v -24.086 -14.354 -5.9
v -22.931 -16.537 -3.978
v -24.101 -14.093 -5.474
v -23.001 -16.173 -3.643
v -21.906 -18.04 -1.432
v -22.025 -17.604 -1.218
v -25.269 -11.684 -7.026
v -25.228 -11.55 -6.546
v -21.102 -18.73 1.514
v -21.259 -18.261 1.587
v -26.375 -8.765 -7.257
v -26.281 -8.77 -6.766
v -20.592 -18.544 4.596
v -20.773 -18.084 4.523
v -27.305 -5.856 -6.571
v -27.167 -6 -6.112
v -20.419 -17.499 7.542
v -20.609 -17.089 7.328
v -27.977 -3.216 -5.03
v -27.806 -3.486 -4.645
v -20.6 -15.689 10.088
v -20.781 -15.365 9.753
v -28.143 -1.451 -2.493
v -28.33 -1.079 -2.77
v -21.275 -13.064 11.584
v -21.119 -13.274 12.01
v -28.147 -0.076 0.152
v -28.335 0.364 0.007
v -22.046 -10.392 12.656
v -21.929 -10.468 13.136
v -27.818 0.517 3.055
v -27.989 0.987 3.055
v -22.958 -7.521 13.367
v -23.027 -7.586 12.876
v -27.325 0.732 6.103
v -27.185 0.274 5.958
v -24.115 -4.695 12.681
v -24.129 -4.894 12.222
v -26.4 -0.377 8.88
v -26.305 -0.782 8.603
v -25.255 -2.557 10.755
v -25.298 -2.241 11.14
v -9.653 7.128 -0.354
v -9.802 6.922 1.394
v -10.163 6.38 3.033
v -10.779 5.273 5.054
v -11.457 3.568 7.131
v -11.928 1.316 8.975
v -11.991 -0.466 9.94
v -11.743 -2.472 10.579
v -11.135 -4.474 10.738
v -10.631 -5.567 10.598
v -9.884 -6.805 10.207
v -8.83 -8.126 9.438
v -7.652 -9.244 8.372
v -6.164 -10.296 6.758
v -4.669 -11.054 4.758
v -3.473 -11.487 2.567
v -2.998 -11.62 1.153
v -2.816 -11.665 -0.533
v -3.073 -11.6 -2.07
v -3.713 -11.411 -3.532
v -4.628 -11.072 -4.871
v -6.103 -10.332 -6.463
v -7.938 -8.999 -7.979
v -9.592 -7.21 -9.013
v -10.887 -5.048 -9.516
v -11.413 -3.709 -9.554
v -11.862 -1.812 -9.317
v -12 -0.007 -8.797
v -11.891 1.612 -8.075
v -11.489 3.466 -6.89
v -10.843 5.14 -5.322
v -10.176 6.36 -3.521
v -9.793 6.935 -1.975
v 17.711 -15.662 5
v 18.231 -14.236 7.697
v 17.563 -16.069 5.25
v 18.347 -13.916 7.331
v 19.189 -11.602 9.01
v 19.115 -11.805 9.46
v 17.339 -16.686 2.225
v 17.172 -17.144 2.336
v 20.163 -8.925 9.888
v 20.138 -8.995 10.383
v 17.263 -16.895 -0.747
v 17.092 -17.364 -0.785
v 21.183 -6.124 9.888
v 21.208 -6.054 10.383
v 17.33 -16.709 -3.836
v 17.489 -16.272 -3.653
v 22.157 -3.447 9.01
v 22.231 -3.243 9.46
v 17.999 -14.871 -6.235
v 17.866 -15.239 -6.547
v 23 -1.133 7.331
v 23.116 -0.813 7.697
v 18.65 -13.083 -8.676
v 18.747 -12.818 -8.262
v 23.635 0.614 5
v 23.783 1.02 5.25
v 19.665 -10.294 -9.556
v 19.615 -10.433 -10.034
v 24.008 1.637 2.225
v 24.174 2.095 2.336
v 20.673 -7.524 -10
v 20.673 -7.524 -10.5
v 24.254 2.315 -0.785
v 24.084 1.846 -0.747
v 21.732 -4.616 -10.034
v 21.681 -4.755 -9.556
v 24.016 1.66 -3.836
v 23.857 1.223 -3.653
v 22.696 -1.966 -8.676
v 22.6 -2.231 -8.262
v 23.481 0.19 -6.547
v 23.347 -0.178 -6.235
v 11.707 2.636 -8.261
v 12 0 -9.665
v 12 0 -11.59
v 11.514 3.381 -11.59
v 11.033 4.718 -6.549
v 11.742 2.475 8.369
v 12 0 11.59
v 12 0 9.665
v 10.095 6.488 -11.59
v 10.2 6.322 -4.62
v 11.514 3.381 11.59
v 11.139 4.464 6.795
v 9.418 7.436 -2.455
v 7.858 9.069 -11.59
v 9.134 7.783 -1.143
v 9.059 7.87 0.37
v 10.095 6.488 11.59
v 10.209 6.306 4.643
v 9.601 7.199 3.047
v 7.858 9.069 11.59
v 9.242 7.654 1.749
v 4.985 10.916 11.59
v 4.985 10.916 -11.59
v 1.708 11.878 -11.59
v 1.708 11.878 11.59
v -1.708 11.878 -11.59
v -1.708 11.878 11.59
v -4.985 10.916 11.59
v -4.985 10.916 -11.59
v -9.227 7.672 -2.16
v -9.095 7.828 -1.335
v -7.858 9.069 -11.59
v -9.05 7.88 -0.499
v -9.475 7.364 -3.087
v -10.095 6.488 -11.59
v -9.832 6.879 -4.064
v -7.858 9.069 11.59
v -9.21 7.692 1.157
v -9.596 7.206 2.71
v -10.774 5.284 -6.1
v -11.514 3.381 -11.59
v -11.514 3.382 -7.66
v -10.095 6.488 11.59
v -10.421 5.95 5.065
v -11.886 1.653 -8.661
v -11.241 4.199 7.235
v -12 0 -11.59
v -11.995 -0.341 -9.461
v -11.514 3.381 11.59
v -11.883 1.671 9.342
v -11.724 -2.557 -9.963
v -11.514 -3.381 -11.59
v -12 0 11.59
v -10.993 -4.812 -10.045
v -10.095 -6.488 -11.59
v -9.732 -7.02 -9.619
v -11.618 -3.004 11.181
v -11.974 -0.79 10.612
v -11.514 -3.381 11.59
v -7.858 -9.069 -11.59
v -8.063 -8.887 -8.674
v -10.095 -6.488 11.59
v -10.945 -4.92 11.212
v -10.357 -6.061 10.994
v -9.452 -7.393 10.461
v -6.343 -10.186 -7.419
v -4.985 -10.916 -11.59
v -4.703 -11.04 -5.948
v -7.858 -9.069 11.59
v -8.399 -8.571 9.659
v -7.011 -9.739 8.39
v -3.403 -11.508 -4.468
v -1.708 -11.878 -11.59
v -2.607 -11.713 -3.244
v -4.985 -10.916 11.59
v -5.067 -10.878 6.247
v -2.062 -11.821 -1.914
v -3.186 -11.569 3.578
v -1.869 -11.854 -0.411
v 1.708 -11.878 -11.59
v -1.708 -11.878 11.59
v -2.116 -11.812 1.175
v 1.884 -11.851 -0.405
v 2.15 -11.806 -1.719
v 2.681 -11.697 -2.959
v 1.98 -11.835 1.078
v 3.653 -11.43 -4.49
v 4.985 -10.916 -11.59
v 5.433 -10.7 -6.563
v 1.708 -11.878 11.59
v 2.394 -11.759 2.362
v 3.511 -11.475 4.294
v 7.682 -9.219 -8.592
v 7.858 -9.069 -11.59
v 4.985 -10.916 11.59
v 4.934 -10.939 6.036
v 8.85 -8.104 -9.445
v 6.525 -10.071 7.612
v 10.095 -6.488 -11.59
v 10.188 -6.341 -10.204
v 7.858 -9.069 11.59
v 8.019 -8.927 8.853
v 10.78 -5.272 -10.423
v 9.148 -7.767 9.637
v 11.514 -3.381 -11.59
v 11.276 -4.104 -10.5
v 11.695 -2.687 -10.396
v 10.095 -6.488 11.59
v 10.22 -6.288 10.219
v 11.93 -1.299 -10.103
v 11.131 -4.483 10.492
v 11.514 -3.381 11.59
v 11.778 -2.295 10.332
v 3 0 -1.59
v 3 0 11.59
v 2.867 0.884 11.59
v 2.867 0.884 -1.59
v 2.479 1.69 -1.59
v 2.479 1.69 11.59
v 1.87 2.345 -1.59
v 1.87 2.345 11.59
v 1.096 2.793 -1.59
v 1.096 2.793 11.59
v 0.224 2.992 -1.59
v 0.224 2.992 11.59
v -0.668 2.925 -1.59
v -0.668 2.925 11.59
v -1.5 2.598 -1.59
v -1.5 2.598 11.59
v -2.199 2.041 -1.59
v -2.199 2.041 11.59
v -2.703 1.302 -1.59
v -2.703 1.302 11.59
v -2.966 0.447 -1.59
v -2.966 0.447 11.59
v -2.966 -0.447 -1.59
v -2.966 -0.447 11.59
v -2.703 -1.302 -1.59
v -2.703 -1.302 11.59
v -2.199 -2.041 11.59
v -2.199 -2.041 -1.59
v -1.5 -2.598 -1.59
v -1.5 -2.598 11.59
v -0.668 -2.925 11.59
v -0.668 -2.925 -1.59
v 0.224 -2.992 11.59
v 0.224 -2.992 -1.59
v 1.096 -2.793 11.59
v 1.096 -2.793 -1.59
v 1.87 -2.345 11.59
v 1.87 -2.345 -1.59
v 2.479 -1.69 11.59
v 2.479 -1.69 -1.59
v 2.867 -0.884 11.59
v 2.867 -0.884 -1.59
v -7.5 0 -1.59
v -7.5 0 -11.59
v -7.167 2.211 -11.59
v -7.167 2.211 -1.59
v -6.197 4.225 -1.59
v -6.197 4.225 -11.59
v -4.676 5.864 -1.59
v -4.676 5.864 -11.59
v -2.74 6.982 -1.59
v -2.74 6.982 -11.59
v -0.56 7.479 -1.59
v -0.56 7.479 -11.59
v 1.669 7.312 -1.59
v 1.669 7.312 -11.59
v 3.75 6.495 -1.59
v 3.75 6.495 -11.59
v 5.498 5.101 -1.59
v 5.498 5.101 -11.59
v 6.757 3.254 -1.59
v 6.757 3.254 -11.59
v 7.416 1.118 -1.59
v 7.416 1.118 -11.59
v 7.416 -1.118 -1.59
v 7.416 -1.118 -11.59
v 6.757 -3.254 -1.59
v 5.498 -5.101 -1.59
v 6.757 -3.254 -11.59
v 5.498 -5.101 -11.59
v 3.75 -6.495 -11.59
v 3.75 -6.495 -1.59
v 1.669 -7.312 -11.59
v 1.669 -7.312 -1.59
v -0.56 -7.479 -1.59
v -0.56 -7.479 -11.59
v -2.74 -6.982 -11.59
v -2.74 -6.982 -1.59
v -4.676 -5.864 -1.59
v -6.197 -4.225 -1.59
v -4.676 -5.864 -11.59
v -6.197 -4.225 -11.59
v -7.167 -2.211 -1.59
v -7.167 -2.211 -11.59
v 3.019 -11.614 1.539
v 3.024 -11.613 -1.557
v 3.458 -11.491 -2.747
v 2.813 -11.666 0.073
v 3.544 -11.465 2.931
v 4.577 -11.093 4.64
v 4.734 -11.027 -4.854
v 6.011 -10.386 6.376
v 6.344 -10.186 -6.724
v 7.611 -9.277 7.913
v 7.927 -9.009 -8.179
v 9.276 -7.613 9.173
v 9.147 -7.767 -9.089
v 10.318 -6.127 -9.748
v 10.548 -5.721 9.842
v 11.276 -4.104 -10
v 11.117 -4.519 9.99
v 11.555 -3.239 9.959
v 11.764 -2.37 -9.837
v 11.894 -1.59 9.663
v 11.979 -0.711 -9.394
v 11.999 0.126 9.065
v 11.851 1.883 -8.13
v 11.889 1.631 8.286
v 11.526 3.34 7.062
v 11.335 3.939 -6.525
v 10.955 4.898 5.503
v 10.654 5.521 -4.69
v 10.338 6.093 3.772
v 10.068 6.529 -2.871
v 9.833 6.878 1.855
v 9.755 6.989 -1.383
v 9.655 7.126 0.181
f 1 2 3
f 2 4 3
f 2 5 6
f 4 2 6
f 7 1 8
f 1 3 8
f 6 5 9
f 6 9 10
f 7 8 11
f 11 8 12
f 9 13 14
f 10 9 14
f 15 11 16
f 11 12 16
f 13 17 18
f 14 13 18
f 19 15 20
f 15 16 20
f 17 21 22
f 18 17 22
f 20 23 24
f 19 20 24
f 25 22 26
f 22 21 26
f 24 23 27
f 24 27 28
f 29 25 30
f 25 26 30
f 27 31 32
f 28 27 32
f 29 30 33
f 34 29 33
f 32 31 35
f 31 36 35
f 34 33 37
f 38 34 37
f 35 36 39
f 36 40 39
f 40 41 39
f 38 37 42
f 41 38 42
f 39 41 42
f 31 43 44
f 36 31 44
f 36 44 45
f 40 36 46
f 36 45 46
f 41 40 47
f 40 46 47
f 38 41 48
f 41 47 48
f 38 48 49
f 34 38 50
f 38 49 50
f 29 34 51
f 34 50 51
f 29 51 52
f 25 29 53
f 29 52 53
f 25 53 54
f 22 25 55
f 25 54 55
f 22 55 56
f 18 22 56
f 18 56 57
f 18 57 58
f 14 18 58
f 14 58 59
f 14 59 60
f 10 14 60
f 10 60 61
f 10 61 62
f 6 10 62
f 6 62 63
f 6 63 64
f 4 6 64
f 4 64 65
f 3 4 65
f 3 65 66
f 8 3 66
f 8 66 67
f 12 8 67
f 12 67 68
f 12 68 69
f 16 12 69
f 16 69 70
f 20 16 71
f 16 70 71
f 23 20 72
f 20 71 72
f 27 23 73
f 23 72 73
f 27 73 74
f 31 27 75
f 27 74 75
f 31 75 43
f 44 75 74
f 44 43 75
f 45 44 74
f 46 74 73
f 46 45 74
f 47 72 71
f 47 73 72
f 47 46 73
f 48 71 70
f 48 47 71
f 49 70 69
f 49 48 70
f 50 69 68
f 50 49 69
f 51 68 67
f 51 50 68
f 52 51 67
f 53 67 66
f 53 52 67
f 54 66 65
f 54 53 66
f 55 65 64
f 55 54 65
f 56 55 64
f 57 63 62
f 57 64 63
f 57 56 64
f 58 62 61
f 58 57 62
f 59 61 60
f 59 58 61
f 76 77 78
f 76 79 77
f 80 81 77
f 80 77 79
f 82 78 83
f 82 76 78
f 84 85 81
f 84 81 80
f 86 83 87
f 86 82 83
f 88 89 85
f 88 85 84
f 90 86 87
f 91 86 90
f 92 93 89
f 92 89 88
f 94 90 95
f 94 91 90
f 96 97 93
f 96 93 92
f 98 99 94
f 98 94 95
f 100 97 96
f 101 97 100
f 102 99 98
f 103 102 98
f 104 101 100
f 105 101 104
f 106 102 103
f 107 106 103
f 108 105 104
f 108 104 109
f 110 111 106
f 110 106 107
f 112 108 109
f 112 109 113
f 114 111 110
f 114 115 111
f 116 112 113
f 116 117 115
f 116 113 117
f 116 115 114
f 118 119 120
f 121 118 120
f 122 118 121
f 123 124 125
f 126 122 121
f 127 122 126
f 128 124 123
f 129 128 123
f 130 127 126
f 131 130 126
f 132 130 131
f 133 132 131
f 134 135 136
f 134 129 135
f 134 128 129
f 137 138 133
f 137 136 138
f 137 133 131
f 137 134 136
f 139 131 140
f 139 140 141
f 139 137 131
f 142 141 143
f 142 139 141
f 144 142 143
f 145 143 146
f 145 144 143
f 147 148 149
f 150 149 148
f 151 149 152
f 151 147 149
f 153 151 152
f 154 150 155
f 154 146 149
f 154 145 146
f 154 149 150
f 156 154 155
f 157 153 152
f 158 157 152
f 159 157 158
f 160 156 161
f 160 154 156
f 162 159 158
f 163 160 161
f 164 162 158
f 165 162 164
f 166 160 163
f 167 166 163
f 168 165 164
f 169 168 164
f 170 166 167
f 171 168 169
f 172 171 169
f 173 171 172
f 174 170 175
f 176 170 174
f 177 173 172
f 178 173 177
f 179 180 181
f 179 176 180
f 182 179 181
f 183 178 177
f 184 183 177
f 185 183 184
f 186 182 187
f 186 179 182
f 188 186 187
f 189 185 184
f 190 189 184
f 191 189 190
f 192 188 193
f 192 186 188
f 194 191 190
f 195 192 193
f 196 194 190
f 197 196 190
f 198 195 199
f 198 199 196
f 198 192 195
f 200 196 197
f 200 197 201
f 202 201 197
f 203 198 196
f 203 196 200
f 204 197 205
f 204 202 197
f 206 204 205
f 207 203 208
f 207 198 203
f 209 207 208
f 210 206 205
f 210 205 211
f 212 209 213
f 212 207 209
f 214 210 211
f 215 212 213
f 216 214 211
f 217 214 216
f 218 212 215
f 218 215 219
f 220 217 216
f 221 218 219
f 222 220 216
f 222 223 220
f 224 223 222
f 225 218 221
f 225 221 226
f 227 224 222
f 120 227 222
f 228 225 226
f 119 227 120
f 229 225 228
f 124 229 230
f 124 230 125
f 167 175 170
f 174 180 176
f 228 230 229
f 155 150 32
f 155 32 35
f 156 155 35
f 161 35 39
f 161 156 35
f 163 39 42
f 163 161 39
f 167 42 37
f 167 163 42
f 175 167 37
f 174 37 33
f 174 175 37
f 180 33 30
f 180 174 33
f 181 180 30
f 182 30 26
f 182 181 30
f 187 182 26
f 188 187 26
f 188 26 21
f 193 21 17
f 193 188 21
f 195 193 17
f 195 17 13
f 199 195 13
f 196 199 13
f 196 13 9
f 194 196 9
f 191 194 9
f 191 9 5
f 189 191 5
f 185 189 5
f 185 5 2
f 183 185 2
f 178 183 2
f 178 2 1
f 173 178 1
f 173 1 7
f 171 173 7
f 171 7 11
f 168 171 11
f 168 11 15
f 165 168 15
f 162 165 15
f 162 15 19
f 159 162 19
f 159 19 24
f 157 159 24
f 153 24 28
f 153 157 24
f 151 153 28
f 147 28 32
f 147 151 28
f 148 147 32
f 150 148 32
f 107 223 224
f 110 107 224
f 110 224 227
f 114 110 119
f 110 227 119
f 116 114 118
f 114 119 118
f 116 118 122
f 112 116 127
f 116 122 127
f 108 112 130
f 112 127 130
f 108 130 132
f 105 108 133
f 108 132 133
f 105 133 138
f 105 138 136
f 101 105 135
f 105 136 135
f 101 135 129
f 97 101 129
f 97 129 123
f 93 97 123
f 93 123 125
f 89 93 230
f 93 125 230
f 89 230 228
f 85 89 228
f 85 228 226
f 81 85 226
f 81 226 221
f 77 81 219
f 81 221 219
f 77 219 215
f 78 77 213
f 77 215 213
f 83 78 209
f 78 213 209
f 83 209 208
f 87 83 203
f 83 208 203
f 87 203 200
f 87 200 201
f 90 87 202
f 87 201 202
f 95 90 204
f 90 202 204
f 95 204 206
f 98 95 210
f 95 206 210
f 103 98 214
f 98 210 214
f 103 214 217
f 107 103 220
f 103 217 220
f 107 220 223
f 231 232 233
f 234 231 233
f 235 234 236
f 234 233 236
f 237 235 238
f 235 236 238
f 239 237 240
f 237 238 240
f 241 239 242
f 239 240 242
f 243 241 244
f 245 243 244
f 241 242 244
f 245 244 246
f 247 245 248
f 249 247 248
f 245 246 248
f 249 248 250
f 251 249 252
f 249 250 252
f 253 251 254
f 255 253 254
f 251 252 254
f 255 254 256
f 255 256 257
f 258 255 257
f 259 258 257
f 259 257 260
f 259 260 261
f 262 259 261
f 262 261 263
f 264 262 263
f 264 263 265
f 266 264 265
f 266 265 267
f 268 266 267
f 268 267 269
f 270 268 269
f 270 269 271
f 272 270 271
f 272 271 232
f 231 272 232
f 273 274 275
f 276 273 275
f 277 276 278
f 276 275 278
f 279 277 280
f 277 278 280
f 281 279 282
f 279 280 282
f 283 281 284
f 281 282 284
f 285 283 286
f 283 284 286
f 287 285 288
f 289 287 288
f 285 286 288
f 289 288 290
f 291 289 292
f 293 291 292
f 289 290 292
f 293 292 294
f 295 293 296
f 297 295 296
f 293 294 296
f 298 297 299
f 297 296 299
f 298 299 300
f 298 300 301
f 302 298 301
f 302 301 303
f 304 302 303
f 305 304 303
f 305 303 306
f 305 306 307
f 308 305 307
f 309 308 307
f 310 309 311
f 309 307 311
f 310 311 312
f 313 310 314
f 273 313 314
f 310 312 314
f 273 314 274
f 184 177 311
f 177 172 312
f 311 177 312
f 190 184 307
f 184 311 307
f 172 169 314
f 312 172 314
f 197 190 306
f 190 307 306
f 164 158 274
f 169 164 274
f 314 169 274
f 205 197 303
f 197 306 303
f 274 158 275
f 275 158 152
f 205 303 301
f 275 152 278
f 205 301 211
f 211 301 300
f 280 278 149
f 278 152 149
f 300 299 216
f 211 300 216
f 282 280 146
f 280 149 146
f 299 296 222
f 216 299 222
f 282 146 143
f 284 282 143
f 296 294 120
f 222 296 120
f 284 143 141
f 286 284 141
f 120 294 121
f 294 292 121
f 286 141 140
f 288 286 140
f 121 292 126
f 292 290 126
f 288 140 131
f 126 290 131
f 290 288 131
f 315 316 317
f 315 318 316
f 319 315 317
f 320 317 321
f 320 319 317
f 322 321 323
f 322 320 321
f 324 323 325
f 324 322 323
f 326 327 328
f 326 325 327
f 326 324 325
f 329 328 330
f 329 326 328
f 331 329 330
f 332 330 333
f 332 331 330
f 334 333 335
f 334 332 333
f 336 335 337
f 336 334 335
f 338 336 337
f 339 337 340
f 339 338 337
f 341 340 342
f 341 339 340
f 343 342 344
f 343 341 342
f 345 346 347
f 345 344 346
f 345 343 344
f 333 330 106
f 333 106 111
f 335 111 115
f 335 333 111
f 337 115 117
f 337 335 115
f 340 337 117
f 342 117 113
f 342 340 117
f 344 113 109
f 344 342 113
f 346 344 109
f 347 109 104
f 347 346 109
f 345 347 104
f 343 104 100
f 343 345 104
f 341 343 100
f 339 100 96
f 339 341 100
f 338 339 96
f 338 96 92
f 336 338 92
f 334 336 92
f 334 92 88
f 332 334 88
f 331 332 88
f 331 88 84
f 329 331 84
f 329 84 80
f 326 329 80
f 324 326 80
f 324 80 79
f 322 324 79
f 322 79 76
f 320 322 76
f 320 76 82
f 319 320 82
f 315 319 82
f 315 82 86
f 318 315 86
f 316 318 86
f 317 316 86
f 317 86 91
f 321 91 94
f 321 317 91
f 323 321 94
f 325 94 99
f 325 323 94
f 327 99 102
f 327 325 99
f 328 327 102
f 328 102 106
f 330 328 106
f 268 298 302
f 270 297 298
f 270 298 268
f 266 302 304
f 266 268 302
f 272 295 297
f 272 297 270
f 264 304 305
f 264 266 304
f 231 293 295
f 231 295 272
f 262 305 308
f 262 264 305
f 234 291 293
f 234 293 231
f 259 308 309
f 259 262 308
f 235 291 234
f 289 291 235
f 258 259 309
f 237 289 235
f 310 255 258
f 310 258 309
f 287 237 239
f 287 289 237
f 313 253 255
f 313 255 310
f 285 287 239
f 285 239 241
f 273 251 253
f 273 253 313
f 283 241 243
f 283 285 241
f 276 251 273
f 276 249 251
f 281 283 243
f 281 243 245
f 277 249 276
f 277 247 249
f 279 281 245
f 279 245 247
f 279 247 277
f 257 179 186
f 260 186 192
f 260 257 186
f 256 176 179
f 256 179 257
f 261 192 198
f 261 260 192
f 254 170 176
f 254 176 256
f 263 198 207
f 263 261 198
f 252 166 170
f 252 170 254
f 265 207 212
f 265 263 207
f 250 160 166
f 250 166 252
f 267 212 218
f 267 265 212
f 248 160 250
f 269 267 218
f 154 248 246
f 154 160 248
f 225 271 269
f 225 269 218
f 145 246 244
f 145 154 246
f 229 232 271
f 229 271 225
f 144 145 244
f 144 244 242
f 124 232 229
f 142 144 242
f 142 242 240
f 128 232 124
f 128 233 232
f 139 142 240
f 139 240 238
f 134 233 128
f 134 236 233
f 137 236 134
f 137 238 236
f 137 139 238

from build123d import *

# Parameters (mm, degrees)
SKETCH1_R           = 12
BOSS_EXTRUDE1_DEPTH = 11.59
EXTRUDE_THIN2_START = -4.1
SKETCH8_R           = 10.5
SKETCH8_R_2         = 10
EXTRUDE_THIN2_DEPTH = 22
SKETCH3_R           = 10.5
SKETCH3_R_2         = 10
EXTRUDE_THIN1_DEPTH = 22
SKETCH4_R           = 7.5
CUT_EXTRUDE1_DEPTH  = 10
SKETCH5_R           = 3
CUT_EXTRUDE2_DEPTH  = 24.1800001


with BuildPart() as part:
    # Sketch1 → Boss-Extrude1 (new body, symmetric)
    with BuildSketch(Plane.XY):
        Circle(SKETCH1_R)
    extrude(amount=BOSS_EXTRUDE1_DEPTH, both=True)

    # Sketch8 → Extrude-Thin2 (add)
    with BuildSketch(Plane(origin=(0, 0, 0), x_dir=(-0.342020143, 0.939692621, 0), z_dir=(0.925416578, 0.336824089, -0.173648178)).offset(EXTRUDE_THIN2_START)):
        with Locations((0, -1.5)):
            Circle(SKETCH8_R)
        with Locations((0, -1.5)):
            Circle(SKETCH8_R_2, mode=Mode.SUBTRACT)
    extrude(amount=-EXTRUDE_THIN2_DEPTH)

    # Sketch3 → Extrude-Thin1 (add)
    with BuildSketch(Plane(origin=(0, 0, 0), x_dir=(0, 0, -1), z_dir=(0.939692621, -0.342020143, 0))):
        Circle(SKETCH3_R)
        Circle(SKETCH3_R_2, mode=Mode.SUBTRACT)
    extrude(amount=EXTRUDE_THIN1_DEPTH)

    # Sketch4 → Cut-Extrude1 (cut)
    with BuildSketch(Plane(origin=(0, 0, -11.59), x_dir=(-1, 0, 0), z_dir=(0, 0, -1))):
        Circle(SKETCH4_R)
    extrude(amount=-CUT_EXTRUDE1_DEPTH, mode=Mode.SUBTRACT)

    # Sketch5 → Cut-Extrude2 (cut, through all)
    with BuildSketch(Plane.XY.offset(11.59)):
        Circle(SKETCH5_R)
    extrude(amount=-CUT_EXTRUDE2_DEPTH, mode=Mode.SUBTRACT)


solid = part.part
